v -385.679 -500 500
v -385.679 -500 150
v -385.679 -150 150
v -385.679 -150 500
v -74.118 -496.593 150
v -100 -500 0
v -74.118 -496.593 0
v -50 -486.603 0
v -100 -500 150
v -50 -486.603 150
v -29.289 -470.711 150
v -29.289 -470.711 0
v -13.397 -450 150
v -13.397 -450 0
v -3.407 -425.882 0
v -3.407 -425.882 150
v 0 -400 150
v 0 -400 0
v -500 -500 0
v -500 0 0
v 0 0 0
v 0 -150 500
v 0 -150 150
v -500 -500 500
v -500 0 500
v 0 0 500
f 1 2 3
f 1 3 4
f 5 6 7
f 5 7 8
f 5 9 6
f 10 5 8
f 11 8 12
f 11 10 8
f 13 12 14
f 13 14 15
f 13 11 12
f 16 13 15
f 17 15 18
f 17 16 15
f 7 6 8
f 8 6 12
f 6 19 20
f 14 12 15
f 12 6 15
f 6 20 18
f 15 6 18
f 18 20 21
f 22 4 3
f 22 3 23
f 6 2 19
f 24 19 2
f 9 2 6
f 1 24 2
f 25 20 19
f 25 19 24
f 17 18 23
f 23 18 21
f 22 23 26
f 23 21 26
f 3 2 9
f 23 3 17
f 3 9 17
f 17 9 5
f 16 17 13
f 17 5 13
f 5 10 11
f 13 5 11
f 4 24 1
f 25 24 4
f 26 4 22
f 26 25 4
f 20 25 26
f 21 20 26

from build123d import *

# Parameters (mm, degrees)
F1_W     = 500
F1_H     = 500
F2_DEPTH = 500
F3_W     = 385.679454
F3_H     = 350
F4_DEPTH = 350
F5_R     = 100


with BuildPart() as f2:
    # F1 (on face) → F2 (new body)
    with BuildSketch(Plane.XZ):
        with Locations((-250, 250)):
            Rectangle(F1_W, F1_H)
    extrude(amount=F2_DEPTH)

    # F3 (on face) → F4 (cut)
    with BuildSketch(Plane.XZ.offset(500)):
        with Locations((-192.839727, 325)):
            Rectangle(F3_W, F3_H)
    extrude(amount=-F4_DEPTH, mode=Mode.SUBTRACT)

    # F5
    f5_edges = [f2.edges().sort_by_distance(p)[0] for p in [
        (0, -500, 75),
    ]]
    fillet(f5_edges, radius=F5_R)


solid = f2.part
